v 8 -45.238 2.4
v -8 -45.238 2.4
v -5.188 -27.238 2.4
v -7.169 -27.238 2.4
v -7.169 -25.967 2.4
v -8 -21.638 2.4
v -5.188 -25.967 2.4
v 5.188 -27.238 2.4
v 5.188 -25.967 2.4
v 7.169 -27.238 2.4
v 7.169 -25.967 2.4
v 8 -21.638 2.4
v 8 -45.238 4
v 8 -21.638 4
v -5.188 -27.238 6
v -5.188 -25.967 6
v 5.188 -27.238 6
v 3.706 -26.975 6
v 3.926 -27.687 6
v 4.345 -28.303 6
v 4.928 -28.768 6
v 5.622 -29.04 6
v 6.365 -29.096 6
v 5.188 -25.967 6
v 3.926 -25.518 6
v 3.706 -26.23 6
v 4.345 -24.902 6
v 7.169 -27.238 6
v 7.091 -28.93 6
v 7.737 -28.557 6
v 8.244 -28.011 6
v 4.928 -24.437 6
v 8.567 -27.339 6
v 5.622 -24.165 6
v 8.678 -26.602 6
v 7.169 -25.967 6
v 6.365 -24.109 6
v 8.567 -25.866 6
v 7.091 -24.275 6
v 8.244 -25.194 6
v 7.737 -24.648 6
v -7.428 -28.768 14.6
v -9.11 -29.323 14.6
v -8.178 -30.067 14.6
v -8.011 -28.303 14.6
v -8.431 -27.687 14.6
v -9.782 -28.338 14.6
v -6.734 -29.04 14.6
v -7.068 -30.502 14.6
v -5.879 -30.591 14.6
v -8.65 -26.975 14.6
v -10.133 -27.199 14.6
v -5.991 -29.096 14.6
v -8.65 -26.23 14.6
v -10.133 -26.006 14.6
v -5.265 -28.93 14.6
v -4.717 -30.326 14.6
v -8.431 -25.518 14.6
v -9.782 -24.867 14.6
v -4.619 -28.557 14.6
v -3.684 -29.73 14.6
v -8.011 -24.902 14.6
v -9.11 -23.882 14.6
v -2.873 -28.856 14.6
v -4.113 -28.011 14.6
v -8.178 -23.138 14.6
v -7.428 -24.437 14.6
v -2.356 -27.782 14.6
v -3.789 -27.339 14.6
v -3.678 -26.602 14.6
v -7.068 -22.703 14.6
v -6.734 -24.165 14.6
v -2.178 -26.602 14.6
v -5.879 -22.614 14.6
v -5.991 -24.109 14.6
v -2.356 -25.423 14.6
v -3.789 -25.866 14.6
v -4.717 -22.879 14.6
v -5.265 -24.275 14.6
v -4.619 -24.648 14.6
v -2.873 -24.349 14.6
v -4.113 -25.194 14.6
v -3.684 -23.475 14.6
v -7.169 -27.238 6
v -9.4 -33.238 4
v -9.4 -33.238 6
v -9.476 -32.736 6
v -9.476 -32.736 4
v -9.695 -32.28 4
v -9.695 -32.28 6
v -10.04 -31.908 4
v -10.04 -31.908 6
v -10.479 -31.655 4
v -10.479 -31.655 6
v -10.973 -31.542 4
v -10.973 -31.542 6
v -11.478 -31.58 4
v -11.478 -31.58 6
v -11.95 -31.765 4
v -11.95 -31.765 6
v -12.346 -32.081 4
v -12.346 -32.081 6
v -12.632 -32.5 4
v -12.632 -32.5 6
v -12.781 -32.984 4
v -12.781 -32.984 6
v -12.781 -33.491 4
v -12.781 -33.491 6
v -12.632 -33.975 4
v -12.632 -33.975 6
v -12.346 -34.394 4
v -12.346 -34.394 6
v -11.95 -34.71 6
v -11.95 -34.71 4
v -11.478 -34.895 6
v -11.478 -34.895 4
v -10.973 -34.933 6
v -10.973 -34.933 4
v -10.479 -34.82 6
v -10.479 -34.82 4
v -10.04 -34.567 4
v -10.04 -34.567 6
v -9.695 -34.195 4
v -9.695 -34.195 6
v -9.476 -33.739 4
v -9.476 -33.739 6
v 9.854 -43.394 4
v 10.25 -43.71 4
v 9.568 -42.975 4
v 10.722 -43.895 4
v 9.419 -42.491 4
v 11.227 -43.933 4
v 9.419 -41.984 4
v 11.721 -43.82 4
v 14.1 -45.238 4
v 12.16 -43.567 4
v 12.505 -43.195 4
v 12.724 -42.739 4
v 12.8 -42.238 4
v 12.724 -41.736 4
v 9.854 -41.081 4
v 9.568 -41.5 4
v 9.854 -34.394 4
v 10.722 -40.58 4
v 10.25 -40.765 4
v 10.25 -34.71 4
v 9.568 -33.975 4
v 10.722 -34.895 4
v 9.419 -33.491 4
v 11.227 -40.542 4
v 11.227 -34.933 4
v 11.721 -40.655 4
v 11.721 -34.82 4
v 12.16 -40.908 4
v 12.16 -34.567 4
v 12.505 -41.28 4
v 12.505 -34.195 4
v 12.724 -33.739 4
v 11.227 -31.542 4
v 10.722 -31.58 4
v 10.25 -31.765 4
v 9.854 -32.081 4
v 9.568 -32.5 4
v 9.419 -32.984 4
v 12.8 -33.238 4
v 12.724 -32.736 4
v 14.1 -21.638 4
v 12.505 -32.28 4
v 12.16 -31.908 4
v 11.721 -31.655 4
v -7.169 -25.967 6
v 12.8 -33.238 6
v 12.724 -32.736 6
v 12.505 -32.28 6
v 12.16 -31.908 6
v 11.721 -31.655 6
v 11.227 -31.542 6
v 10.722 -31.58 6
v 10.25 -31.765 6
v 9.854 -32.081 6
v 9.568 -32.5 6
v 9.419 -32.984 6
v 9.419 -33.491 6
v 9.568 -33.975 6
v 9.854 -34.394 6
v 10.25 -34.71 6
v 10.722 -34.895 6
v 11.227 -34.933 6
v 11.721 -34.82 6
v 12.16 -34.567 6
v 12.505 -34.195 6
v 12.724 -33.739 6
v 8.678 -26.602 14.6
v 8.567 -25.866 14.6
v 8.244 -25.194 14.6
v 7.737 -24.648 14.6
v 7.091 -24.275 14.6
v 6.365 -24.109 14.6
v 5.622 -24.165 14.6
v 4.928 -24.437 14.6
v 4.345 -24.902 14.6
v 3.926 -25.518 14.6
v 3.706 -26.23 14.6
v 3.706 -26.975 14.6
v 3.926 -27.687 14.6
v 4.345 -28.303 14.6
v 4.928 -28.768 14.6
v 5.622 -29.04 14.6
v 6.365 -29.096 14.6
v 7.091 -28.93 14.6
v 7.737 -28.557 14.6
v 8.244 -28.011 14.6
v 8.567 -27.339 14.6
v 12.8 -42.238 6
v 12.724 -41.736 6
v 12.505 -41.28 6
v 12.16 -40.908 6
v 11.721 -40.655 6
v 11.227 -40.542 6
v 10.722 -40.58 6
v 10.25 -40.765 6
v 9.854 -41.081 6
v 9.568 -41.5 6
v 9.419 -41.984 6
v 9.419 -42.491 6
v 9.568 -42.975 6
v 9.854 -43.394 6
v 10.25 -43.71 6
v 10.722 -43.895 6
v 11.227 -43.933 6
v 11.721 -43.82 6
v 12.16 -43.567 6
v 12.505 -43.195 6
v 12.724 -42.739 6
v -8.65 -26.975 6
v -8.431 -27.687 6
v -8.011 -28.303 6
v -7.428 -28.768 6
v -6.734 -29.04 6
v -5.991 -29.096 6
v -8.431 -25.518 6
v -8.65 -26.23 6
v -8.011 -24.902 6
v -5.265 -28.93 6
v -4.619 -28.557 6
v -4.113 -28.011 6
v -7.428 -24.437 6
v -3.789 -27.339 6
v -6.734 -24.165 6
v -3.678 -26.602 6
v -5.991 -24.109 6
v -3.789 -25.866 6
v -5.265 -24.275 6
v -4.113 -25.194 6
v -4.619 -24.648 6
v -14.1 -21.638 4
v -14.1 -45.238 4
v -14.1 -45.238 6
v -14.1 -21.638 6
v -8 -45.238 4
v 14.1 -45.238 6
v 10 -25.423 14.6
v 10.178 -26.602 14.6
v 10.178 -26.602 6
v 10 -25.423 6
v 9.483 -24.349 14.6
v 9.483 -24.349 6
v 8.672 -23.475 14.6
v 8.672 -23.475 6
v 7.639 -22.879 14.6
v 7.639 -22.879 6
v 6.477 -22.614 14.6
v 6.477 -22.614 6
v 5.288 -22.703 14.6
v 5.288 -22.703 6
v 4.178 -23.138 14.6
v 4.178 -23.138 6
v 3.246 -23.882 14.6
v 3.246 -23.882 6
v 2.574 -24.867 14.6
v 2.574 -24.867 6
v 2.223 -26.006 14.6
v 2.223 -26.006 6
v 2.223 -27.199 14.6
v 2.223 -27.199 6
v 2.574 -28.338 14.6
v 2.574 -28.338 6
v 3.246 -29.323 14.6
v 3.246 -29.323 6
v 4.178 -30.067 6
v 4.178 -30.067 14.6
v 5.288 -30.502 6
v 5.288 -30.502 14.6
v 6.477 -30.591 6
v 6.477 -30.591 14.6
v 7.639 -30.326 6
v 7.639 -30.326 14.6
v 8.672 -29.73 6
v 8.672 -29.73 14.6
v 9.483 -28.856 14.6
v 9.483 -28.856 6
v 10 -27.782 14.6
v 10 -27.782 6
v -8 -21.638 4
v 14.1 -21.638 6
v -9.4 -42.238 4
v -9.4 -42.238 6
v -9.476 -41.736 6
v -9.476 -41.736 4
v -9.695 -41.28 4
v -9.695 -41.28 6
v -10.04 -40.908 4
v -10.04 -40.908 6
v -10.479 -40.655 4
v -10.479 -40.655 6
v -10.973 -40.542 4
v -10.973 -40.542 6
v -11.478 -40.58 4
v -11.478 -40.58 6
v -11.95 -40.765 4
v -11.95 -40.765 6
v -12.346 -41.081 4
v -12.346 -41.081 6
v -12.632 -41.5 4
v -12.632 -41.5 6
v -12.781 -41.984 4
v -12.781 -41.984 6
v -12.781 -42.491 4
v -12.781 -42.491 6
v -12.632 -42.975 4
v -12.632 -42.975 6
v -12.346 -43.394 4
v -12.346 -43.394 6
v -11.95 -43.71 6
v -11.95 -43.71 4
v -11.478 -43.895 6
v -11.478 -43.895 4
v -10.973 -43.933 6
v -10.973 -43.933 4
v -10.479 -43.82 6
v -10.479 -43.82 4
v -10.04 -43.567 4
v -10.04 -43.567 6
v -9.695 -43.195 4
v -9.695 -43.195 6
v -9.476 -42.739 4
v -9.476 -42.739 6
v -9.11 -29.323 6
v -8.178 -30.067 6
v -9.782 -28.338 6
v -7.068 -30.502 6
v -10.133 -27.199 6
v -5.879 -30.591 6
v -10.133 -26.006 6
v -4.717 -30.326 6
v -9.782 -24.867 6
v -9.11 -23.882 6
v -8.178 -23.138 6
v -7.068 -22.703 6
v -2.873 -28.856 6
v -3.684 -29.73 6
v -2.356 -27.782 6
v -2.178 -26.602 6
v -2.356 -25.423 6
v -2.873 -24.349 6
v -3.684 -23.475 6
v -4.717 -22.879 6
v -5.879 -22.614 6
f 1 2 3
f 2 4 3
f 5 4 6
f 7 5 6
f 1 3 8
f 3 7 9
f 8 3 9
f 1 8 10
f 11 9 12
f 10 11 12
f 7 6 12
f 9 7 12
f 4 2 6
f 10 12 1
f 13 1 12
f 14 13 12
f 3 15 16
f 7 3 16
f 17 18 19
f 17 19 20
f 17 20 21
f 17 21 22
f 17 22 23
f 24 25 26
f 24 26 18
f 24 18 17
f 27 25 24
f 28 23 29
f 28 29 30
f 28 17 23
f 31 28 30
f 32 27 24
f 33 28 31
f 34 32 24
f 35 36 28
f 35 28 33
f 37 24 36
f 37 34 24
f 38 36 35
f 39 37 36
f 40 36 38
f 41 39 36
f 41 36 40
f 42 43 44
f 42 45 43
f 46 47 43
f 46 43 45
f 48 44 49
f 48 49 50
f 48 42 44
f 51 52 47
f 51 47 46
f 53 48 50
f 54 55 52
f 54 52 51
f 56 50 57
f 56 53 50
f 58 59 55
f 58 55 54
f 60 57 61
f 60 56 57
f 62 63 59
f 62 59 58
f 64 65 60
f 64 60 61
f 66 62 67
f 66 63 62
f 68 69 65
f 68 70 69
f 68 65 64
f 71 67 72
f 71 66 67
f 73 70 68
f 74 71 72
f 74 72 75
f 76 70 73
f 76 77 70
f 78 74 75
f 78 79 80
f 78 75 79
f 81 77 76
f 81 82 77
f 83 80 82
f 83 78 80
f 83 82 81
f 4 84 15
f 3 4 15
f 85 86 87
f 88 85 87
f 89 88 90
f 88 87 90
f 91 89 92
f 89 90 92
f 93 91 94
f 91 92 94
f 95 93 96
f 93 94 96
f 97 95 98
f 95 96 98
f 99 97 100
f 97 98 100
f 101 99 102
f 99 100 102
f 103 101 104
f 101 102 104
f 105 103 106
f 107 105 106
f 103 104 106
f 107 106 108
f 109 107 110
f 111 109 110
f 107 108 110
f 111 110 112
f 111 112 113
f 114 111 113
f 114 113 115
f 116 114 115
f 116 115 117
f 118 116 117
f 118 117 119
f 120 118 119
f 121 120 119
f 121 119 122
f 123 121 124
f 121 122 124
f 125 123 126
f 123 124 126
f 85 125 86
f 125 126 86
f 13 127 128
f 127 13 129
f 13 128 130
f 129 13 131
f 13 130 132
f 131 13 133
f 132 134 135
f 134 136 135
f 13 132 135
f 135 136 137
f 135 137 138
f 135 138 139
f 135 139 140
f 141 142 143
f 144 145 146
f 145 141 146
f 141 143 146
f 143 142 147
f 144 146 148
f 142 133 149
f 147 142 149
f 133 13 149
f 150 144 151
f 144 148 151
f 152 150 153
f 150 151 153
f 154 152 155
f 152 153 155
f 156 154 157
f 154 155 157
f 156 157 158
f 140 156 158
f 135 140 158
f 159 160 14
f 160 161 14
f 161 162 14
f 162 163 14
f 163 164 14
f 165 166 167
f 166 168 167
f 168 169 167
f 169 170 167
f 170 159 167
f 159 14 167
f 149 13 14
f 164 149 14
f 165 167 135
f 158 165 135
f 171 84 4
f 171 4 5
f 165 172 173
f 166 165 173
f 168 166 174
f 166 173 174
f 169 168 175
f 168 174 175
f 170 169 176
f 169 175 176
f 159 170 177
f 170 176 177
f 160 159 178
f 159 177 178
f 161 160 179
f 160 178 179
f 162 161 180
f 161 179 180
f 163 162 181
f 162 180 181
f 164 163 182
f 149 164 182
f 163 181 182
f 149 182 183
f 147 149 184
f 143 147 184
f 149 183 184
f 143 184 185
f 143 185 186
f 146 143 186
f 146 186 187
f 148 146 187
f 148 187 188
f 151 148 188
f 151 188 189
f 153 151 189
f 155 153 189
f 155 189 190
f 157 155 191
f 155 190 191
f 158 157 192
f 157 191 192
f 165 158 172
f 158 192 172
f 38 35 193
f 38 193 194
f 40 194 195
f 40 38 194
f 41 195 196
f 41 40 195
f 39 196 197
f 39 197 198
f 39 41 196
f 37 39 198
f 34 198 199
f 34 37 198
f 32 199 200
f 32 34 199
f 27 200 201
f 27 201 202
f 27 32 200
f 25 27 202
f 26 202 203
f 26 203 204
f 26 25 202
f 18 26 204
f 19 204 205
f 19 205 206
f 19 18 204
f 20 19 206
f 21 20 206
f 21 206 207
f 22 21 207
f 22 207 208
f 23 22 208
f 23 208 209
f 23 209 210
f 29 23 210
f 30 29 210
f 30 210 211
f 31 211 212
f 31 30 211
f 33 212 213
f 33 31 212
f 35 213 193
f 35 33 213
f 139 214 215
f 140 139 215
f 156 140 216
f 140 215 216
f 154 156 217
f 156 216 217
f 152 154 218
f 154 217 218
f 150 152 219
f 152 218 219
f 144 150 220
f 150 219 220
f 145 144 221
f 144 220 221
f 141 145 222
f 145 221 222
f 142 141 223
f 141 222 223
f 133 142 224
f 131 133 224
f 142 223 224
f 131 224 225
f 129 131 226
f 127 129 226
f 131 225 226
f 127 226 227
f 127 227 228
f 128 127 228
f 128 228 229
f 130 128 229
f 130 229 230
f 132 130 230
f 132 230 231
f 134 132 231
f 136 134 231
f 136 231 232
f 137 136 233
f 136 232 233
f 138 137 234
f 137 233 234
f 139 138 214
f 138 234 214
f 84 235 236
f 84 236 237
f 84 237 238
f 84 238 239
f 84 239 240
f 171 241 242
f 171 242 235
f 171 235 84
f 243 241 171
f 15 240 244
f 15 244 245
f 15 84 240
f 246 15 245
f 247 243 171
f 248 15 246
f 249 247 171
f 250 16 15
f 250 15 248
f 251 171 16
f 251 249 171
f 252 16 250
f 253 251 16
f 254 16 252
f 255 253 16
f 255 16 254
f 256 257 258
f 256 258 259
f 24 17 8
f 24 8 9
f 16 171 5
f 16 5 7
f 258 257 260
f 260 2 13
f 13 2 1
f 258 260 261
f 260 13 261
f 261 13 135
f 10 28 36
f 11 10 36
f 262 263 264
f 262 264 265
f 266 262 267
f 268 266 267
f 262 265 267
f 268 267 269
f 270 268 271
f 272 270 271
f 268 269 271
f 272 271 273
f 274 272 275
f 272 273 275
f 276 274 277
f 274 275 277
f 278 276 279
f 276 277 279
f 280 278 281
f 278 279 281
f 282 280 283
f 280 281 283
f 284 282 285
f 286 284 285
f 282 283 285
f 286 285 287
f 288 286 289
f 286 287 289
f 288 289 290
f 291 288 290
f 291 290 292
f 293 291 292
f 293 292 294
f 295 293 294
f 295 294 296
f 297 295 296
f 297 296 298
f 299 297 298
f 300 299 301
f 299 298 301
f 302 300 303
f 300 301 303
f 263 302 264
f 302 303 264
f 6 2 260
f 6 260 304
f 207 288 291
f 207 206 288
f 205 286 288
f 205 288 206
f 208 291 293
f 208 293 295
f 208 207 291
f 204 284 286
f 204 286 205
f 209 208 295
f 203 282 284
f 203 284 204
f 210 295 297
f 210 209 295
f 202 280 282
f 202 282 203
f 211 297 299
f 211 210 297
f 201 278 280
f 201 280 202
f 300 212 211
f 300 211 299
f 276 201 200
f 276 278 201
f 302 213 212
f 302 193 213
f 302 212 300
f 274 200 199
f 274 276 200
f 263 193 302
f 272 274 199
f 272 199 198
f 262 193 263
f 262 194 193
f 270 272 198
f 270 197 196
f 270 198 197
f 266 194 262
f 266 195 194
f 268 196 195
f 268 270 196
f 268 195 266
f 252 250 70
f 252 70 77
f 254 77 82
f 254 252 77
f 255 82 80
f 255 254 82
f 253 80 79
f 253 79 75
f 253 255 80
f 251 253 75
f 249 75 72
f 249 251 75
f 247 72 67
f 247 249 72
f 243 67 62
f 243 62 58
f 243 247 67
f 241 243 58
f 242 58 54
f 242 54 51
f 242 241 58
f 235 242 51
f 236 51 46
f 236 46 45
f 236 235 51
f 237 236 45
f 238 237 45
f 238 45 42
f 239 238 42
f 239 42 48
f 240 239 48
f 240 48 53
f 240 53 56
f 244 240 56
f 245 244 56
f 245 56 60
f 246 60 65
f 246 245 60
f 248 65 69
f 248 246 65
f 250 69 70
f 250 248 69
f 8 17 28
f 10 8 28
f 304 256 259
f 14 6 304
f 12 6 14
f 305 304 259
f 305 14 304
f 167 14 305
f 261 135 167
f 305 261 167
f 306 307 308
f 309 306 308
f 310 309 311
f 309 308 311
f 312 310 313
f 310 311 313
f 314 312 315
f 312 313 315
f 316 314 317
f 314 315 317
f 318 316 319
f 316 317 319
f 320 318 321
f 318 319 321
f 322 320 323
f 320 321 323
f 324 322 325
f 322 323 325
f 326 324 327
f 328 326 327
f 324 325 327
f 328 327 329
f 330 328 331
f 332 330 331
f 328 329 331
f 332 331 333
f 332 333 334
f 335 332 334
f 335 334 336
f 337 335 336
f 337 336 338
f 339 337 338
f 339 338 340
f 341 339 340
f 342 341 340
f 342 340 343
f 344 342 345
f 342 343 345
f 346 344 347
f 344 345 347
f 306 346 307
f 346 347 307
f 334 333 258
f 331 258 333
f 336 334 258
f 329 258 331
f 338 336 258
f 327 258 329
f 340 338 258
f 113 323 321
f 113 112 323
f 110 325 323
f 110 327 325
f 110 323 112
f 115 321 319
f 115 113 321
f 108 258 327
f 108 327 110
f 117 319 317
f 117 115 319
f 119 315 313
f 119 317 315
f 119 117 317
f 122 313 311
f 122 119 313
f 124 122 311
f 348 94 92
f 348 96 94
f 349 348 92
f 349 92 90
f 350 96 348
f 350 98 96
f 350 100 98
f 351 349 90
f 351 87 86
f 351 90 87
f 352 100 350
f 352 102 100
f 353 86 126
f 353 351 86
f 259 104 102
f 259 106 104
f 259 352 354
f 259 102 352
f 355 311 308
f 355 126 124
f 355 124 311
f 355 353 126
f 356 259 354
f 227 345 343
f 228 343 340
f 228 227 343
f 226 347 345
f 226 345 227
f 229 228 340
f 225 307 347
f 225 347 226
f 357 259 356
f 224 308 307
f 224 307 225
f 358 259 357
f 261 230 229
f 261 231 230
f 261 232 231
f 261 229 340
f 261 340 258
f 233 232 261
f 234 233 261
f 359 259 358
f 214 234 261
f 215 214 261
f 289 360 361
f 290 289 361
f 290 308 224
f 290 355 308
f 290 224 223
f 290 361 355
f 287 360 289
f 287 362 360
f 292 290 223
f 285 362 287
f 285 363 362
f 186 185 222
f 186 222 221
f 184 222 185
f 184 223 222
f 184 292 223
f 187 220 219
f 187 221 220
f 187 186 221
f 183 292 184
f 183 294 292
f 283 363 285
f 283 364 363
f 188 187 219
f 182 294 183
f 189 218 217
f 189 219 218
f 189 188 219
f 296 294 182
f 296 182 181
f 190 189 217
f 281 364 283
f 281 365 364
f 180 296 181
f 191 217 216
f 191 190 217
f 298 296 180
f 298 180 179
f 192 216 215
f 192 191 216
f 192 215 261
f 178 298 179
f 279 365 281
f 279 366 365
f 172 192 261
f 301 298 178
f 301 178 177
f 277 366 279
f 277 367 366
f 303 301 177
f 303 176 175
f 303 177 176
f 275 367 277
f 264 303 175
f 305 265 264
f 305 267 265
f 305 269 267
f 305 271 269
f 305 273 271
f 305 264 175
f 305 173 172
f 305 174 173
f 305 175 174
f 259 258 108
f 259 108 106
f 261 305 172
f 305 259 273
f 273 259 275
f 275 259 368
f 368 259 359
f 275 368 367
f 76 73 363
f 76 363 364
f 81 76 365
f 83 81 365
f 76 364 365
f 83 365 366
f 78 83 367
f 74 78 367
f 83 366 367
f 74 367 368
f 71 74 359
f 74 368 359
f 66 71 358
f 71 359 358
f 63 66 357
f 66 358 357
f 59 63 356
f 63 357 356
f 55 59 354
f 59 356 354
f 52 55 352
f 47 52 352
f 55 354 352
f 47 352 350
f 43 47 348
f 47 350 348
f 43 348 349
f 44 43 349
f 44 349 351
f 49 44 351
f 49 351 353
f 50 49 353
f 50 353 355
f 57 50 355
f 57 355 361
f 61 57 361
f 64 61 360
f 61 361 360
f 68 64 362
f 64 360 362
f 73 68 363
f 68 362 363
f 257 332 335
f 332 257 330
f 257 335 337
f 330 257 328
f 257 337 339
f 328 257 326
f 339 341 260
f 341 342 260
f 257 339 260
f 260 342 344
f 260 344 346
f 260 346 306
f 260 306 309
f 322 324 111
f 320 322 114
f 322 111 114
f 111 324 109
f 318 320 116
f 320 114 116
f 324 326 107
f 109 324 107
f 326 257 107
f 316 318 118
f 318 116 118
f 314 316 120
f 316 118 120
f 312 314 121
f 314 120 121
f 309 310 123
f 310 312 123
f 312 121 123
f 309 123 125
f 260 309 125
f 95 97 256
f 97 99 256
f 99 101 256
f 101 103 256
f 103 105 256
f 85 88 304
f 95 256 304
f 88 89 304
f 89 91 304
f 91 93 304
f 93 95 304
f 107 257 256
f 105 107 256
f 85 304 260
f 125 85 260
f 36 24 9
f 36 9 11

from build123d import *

# Parameters (mm, degrees)
SKETCH005_W     = 16
SKETCH005_H     = 23.6
PAD001_DEPTH    = 1.6
SKETCH006_W     = 28.2
SKETCH006_H     = 23.6
PAD002_DEPTH    = 2
SKETCH007_W     = 1.9812
SKETCH007_H     = 1.27
POCKET002_DEPTH = 3.601
SKETCH008_R     = 4
SKETCH008_R_2   = 2.5
PAD003_DEPTH    = 8.6
SKETCH009_R     = 1.7
POCKET003_DEPTH = 2


with BuildPart() as part:
    # Sketch005 → Pad001 (new body)
    with BuildSketch(Plane.XY):
        with Locations((0, -33.4375)):
            Rectangle(SKETCH005_W, SKETCH005_H)
    extrude(amount=PAD001_DEPTH)

    # Sketch006 (on Face6 of Pad001) → Pad002 (join)
    with BuildSketch(Plane.XY.offset(1.6)):
        with Locations((0, -33.4375)):
            Rectangle(SKETCH006_W, SKETCH006_H)
    extrude(amount=PAD002_DEPTH)

    # Sketch007 (on Face7 of Pad002) → Pocket002 (cut, through all)
    with BuildSketch(Plane.XY.offset(3.6)):
        with Locations((-6.1781, -26.6025)):
            Rectangle(SKETCH007_W, SKETCH007_H)
        with Locations((6.1781, -26.6025)):
            Rectangle(SKETCH007_W, SKETCH007_H)
    extrude(amount=-POCKET002_DEPTH, mode=Mode.SUBTRACT)

    # Sketch008 (on Face7 of Pocket002) → Pad003 (join)
    with BuildSketch(Plane.XY.offset(3.6)):
        with Locations((-6.1781, -26.6025)):
            Circle(SKETCH008_R)
        with Locations((-6.1781, -26.6025)):
            Circle(SKETCH008_R_2, mode=Mode.SUBTRACT)
        with Locations((6.1781, -26.6025)):
            Circle(SKETCH008_R)
        with Locations((6.1781, -26.6025)):
            Circle(SKETCH008_R_2, mode=Mode.SUBTRACT)
    extrude(amount=PAD003_DEPTH)

    # Sketch009 (on Face7 of Pad003) → Pocket003 (cut)
    with BuildSketch(Plane.XY.offset(3.6)):
        with Locations((-11.1, -42.2375)):
            Circle(SKETCH009_R)
        with Locations((11.1, -42.2375)):
            Circle(SKETCH009_R)
        with Locations((-11.1, -33.2375)):
            Circle(SKETCH009_R)
        with Locations((11.1, -33.2375)):
            Circle(SKETCH009_R)
    extrude(amount=-POCKET003_DEPTH, mode=Mode.SUBTRACT)


with BuildPart() as part_1:
    # Body001 placement: moved
    add(part.part.moved(Location((0, 0, 2.4))))


solid = part_1.part
